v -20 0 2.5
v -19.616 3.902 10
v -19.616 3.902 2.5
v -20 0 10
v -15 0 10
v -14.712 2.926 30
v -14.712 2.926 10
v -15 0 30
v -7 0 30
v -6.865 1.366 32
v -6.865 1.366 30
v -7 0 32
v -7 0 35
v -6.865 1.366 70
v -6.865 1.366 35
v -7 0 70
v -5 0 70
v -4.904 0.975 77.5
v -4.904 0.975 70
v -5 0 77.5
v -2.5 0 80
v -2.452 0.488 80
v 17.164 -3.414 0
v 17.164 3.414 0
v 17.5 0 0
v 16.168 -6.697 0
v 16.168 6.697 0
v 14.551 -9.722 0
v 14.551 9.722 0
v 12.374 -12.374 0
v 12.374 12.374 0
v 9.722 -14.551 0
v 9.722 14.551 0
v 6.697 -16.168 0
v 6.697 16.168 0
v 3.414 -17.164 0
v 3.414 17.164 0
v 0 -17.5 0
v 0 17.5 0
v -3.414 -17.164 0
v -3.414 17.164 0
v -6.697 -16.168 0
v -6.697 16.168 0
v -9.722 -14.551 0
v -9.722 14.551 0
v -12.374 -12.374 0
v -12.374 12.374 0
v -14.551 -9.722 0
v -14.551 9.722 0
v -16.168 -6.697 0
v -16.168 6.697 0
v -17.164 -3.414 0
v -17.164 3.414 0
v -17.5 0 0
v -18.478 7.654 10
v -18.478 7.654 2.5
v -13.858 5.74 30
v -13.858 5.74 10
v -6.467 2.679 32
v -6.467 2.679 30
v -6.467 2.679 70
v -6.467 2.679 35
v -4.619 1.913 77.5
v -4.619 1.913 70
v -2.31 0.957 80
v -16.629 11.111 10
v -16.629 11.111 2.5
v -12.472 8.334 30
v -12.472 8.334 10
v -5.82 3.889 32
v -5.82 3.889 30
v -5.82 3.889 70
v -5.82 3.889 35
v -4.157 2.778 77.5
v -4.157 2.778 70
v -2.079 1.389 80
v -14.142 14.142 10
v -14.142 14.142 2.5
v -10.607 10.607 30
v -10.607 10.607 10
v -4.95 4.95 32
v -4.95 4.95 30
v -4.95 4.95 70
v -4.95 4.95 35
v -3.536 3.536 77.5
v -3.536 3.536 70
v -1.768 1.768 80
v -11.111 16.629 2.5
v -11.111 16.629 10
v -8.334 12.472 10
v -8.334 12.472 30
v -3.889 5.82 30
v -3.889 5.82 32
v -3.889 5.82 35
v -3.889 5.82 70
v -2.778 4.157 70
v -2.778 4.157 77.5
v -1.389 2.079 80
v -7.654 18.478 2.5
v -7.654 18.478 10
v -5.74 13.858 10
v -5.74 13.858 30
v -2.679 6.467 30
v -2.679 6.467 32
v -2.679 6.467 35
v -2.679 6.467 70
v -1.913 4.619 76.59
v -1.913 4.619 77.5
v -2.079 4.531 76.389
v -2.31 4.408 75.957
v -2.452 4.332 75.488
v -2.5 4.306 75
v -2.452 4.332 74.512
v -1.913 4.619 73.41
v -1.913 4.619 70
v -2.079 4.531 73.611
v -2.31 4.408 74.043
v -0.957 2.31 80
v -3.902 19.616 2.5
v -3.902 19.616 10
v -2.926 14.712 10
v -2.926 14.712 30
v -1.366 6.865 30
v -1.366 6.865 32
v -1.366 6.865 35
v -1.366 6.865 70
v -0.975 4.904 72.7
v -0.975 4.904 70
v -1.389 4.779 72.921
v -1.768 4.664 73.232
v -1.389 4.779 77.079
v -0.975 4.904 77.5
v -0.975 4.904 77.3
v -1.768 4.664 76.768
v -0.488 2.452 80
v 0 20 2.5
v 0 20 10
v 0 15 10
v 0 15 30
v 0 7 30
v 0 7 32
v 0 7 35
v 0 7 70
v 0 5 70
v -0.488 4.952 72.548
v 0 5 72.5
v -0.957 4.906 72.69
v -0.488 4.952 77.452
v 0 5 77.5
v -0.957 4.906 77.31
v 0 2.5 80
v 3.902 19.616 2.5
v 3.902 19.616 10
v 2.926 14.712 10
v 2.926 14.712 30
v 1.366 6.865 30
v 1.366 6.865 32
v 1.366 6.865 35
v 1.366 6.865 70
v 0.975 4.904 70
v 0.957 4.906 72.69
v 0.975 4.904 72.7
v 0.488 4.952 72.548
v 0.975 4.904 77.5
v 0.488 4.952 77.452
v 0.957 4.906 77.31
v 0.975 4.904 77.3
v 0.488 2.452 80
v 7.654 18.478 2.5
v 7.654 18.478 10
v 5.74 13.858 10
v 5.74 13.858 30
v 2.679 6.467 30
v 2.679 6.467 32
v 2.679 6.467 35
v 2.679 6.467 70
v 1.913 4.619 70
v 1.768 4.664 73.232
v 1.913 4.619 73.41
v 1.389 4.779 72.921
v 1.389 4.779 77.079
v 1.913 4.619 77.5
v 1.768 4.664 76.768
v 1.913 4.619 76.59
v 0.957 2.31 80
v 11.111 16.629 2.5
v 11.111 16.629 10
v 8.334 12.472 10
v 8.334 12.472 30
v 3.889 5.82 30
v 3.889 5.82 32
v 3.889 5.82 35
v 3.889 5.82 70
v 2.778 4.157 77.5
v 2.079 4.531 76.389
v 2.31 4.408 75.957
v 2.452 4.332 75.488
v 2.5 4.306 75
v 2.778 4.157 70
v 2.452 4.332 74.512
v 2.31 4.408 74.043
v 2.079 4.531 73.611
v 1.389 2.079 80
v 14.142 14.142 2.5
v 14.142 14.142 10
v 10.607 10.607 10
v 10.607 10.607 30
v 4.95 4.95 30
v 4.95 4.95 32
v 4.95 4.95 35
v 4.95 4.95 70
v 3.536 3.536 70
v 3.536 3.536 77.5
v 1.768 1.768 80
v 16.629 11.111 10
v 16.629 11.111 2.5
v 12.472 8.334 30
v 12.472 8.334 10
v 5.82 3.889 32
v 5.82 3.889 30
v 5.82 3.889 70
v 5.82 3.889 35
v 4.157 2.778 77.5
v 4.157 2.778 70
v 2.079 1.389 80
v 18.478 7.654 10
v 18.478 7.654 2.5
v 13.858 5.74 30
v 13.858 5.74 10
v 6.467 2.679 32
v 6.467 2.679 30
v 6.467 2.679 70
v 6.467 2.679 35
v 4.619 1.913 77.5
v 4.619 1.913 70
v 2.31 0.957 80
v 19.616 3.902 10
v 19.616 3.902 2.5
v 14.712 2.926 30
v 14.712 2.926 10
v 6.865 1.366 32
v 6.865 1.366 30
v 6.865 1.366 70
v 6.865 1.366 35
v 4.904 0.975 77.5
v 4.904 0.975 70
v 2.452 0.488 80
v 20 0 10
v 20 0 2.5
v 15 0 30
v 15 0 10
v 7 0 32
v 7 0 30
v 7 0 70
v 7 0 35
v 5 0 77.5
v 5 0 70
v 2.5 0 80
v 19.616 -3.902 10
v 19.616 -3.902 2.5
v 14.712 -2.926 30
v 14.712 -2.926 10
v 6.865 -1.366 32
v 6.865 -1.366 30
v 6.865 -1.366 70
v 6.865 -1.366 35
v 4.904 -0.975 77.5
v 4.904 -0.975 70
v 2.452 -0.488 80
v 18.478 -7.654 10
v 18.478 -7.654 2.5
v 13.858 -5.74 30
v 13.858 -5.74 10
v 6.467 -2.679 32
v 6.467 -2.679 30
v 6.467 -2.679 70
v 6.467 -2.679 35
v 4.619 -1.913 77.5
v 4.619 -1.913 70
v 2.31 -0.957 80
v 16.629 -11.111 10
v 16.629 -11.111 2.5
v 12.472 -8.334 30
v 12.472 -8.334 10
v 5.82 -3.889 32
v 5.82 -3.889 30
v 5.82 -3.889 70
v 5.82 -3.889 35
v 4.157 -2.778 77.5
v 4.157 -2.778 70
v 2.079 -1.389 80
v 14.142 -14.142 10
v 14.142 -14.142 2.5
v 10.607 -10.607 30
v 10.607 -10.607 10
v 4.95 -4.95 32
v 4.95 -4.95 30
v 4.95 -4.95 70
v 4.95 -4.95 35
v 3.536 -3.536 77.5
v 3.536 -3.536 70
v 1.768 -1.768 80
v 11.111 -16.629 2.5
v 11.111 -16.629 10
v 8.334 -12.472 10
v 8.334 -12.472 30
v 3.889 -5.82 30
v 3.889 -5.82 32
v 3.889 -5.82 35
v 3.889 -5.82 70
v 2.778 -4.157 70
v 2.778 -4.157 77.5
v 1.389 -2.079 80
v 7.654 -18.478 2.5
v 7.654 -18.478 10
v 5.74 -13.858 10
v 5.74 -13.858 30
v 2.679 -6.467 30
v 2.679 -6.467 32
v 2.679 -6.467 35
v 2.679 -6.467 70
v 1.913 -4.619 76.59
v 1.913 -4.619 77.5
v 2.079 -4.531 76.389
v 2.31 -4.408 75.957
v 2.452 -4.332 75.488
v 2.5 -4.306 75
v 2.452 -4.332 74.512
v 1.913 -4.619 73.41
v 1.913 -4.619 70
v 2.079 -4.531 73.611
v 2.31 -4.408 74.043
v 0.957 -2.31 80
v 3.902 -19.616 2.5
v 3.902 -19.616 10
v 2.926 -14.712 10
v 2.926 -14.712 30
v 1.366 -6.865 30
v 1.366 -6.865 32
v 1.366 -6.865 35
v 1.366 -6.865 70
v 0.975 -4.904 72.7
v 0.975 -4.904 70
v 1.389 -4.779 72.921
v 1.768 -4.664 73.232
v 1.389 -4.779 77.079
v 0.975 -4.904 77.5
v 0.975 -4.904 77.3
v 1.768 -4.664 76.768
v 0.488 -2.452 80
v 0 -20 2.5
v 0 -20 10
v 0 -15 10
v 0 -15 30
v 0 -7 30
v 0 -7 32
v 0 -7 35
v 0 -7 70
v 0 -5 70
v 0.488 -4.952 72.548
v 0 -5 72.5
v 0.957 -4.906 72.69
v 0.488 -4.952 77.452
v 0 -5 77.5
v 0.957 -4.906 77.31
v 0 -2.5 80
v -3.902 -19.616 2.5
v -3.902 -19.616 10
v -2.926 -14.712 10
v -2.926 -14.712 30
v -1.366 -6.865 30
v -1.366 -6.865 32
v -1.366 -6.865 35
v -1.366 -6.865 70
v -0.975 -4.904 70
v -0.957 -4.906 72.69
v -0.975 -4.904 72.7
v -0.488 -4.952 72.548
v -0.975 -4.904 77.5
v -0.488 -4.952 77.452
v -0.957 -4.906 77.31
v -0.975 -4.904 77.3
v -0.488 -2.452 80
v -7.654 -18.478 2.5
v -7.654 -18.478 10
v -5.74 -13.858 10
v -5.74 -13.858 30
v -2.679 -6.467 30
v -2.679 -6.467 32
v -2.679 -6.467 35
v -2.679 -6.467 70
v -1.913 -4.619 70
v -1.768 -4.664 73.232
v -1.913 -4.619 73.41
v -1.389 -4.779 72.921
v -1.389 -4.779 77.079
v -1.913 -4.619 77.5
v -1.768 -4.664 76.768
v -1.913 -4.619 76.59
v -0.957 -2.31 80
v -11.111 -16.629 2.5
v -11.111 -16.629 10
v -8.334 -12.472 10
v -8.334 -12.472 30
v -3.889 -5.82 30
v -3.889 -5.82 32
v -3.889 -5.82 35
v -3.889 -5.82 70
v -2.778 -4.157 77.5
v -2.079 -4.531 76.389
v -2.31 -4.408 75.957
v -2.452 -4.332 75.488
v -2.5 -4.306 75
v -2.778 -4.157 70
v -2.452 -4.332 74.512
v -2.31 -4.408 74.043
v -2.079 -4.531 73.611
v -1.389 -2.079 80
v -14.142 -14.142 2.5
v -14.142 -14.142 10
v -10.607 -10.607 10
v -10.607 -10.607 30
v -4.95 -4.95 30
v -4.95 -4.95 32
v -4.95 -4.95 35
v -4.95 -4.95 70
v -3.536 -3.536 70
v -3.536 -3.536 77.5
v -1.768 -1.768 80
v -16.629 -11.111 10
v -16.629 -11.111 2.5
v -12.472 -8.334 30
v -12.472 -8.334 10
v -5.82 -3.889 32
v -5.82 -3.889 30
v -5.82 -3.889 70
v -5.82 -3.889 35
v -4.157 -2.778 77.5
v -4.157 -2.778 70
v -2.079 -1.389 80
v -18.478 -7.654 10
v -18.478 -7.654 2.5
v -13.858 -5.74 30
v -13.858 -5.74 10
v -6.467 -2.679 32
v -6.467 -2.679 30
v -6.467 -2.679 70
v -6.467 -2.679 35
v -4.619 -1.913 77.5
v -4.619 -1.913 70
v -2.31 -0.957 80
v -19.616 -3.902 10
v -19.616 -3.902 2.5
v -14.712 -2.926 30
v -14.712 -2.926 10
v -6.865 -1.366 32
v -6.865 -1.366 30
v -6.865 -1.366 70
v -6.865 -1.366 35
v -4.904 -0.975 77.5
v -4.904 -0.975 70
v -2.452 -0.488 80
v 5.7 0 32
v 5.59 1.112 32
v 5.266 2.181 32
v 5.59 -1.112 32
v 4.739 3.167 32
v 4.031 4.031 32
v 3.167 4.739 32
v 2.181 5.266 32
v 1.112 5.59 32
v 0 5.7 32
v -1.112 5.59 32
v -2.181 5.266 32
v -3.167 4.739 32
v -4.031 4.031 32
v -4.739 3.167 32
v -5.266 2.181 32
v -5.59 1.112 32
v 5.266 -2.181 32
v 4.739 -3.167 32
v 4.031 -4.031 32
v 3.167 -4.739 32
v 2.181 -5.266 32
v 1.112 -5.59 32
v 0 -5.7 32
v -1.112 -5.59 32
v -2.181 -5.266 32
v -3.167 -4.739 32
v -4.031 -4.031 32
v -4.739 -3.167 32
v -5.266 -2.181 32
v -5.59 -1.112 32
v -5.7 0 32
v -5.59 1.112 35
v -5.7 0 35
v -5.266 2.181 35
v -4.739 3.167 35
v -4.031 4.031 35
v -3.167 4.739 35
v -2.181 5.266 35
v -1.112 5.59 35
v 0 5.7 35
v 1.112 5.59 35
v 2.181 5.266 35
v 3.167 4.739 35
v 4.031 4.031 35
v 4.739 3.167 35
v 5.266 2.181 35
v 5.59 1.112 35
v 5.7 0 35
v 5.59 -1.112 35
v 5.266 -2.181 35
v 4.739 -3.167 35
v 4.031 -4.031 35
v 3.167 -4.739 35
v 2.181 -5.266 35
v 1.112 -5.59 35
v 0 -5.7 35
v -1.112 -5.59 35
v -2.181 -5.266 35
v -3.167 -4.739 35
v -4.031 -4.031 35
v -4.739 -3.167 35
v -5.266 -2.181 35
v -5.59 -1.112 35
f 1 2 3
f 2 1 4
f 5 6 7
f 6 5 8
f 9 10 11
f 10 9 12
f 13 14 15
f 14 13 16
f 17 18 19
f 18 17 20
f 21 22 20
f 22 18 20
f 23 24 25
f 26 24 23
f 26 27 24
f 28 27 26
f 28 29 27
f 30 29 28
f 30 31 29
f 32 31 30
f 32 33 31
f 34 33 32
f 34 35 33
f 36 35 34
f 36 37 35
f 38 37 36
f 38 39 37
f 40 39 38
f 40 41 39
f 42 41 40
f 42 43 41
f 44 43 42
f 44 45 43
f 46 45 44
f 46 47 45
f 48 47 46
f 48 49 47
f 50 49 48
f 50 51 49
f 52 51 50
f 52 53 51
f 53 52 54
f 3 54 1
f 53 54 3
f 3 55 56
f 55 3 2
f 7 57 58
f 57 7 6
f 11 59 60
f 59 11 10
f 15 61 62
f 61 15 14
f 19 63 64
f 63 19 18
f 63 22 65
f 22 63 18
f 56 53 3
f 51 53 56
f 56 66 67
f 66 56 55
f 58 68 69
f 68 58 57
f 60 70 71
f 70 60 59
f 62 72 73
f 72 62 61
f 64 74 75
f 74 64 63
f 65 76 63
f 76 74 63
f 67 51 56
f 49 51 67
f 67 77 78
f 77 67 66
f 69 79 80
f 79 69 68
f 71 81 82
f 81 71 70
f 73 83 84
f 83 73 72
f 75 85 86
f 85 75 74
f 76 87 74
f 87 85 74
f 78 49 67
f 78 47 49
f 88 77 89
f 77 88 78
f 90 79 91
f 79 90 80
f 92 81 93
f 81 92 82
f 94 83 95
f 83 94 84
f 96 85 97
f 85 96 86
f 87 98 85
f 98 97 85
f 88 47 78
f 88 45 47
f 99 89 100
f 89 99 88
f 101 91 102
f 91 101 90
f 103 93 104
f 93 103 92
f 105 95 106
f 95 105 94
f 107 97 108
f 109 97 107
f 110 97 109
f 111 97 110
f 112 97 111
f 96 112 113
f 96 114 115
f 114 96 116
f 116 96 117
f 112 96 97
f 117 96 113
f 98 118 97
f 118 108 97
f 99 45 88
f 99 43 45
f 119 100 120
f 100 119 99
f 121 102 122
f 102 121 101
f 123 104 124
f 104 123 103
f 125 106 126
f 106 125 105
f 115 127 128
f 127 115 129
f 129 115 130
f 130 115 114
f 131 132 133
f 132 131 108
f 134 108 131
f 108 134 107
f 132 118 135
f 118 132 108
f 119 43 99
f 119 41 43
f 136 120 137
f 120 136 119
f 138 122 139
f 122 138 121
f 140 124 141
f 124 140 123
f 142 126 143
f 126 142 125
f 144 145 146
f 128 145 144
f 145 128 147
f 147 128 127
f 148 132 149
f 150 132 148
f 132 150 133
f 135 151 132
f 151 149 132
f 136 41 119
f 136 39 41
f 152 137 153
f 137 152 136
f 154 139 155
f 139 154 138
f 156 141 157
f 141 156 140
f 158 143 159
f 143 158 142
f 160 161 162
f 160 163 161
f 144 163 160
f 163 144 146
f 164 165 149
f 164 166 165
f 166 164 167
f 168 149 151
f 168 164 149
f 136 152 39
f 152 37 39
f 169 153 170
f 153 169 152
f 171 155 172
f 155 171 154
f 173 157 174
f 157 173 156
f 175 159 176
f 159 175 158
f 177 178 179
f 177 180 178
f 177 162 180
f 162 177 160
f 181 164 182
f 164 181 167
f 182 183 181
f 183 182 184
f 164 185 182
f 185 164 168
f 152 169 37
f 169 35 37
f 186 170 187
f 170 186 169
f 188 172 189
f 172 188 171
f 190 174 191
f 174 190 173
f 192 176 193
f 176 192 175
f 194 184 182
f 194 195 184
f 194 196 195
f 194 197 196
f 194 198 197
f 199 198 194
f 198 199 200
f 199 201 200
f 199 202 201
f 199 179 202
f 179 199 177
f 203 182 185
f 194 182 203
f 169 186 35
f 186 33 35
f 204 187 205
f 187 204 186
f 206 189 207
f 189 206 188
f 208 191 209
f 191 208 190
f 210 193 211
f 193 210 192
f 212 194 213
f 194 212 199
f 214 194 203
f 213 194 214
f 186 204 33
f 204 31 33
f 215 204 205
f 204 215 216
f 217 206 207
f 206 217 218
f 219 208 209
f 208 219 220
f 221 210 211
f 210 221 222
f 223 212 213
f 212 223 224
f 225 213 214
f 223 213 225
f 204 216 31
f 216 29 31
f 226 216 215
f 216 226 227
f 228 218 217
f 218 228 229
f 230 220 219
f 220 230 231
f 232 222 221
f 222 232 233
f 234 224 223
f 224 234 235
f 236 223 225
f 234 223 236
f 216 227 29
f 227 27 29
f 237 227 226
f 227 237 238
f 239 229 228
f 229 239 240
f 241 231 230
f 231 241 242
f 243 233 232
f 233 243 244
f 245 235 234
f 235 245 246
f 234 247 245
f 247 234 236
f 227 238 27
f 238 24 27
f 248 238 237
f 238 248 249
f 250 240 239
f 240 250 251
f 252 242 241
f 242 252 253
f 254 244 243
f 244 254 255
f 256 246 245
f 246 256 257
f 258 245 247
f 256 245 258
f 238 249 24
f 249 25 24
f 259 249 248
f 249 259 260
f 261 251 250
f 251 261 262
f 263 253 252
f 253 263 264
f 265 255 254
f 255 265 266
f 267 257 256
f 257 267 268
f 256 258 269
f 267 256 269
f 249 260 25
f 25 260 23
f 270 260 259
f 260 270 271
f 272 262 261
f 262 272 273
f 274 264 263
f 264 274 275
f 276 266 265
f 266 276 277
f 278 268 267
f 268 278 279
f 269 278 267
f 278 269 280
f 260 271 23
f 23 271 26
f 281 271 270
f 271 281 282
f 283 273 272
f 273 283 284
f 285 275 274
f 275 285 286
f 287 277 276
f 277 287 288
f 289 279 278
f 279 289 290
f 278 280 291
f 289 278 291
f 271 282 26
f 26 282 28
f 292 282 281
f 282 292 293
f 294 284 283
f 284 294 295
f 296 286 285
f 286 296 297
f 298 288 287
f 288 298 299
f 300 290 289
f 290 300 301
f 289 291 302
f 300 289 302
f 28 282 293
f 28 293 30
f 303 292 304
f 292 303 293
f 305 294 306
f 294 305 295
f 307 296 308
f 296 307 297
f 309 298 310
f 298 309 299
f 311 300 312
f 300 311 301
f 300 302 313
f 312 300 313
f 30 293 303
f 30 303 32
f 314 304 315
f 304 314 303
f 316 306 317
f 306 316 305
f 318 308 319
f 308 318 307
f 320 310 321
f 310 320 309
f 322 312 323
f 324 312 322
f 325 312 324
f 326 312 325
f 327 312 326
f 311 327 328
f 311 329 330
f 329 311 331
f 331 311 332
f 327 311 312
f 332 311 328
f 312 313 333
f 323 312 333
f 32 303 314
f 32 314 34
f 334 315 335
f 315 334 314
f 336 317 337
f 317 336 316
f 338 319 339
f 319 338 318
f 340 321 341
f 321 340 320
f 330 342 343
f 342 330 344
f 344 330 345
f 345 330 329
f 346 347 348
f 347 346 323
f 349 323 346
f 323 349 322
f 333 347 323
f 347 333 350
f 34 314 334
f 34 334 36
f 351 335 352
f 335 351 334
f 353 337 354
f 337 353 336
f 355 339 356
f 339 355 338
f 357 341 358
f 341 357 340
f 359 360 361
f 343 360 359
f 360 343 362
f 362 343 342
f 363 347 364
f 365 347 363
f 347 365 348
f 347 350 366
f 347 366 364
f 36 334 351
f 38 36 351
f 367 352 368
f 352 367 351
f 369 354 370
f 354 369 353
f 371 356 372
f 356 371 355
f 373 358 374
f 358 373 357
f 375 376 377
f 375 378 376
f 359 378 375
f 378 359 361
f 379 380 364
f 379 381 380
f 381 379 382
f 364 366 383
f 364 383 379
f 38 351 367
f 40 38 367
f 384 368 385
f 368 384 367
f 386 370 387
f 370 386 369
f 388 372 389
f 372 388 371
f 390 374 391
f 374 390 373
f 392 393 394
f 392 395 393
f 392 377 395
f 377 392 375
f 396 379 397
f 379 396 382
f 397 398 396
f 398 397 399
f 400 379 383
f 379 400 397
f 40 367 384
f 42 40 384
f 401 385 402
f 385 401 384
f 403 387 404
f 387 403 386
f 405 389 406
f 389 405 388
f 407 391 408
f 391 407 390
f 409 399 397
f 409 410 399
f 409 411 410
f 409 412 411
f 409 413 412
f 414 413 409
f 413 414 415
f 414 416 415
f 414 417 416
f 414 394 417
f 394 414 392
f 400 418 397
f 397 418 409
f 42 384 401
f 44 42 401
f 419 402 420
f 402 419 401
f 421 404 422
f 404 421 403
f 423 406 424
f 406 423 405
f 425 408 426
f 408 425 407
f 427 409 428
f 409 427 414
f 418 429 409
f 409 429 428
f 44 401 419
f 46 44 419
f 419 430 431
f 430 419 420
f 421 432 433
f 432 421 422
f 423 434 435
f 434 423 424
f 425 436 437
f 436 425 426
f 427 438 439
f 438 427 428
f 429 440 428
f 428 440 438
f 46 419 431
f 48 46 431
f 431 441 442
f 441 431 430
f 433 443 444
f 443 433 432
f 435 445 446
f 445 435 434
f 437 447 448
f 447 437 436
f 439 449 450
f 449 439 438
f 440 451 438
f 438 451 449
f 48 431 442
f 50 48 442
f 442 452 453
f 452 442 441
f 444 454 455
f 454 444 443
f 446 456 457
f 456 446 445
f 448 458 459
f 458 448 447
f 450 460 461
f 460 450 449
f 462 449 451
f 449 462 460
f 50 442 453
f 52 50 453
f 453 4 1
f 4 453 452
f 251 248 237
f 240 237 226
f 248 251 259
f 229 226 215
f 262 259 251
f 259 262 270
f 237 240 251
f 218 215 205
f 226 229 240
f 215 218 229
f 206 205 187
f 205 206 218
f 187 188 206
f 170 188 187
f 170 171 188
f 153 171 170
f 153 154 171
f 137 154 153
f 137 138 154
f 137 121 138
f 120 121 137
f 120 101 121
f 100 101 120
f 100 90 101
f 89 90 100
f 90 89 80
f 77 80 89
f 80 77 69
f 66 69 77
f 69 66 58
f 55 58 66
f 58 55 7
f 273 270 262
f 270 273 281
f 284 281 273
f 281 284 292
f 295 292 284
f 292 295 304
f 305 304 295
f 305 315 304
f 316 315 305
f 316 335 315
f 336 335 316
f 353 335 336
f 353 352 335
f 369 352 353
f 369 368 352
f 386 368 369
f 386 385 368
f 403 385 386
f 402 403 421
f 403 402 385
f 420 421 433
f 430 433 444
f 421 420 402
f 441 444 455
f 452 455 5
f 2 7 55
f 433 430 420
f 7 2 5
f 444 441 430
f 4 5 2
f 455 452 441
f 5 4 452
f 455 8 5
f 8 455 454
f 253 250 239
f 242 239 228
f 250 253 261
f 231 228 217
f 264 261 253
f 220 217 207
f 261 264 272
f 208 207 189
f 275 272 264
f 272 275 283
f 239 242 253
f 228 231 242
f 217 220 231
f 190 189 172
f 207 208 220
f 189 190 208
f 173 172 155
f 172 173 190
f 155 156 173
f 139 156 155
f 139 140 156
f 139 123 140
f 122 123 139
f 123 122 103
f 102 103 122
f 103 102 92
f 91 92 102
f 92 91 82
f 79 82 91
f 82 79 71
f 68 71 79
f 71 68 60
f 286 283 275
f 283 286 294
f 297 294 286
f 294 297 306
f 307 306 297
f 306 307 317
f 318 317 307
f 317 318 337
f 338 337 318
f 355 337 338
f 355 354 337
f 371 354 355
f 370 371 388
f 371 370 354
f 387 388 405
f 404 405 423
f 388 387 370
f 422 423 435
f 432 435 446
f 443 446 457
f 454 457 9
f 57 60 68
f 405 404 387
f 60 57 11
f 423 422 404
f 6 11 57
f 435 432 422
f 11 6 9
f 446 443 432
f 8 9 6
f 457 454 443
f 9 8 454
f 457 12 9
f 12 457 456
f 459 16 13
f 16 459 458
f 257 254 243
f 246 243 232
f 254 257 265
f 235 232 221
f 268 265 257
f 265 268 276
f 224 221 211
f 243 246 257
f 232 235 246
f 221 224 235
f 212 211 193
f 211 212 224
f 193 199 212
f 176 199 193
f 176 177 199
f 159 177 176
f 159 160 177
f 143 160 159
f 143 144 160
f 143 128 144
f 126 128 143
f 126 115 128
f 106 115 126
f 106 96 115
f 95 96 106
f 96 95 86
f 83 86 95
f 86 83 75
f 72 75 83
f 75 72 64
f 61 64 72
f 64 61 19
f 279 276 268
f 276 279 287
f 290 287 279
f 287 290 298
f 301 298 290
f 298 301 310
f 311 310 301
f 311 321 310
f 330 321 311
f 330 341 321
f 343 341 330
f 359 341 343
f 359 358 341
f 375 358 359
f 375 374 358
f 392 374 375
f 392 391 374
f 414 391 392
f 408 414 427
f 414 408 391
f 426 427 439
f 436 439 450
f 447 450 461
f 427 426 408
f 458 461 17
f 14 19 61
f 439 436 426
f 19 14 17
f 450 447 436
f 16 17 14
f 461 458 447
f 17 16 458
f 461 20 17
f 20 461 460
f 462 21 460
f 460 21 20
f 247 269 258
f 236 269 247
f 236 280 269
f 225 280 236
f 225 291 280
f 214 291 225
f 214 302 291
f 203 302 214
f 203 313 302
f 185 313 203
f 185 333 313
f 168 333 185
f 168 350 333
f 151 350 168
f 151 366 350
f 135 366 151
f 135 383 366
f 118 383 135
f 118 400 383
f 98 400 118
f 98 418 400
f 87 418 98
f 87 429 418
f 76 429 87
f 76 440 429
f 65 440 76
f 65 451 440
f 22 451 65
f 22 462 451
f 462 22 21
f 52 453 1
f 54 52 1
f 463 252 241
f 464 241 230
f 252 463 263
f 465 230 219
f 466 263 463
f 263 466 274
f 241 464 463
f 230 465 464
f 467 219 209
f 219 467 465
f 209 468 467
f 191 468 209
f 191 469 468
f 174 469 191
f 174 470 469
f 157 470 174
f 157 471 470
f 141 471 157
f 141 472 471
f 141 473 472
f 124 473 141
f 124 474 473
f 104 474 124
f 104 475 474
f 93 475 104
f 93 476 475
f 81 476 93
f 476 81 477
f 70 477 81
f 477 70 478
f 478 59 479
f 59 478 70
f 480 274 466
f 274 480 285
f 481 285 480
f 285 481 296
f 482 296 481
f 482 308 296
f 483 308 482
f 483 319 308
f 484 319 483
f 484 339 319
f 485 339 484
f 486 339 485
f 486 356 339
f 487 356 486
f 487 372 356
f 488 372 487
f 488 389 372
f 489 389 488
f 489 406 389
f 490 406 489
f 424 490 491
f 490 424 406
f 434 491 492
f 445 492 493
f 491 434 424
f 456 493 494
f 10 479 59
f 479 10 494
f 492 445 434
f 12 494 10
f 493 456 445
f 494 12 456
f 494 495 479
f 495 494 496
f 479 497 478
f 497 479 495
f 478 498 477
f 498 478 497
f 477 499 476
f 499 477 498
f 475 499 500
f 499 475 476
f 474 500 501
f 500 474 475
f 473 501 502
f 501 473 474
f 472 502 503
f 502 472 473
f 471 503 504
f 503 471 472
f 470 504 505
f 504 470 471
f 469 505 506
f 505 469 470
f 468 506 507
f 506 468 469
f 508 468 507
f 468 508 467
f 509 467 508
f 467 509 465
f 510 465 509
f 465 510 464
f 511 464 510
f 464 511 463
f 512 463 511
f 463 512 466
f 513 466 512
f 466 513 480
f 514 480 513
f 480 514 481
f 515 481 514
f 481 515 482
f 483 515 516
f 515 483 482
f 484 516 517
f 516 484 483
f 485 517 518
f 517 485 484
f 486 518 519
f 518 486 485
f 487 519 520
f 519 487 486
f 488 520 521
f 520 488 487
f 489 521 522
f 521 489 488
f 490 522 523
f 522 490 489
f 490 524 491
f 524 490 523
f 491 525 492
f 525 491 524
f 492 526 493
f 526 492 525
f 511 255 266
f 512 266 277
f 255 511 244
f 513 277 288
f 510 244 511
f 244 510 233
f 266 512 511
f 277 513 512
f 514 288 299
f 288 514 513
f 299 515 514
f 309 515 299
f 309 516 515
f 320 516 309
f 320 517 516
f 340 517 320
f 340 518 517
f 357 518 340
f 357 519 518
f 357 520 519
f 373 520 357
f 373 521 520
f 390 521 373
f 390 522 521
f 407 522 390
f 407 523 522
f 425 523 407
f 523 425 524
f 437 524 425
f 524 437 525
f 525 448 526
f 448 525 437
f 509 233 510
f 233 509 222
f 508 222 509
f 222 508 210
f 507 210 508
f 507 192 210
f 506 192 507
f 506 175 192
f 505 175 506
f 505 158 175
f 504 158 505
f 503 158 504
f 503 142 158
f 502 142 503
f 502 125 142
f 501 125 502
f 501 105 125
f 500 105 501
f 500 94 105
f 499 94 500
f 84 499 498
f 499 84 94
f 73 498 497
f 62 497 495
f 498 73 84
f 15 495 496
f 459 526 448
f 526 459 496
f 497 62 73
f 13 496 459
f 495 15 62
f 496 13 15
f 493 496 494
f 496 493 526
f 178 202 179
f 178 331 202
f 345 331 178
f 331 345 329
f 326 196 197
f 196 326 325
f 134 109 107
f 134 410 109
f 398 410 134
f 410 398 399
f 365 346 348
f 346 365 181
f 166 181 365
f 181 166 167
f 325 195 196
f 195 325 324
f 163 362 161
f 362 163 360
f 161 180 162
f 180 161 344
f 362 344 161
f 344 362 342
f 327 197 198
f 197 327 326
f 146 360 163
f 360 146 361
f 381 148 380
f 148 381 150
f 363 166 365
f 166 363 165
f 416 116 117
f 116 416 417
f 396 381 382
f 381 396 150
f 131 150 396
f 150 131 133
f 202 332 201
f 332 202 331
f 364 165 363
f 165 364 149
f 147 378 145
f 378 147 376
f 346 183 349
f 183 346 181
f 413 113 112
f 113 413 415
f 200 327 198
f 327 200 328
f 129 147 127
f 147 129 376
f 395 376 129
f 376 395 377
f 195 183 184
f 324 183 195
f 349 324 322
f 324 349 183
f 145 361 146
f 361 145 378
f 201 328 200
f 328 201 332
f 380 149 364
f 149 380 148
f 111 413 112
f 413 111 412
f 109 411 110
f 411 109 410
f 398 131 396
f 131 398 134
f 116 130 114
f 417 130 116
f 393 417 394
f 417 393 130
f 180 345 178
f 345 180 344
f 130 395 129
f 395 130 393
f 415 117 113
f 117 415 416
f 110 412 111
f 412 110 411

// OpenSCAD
$fn = 32;

// ----------------------------------------------------------------------
// Stepped shaft: diameters 40, 30, 14, 10 mm, 80 mm long
// ----------------------------------------------------------------------

// --- parameters (mm) ---
d1 = 40;                  // step 1 diameter
len1 = 10;                // step 1 length
d2 = 30;                  // step 2 diameter
len2 = 20;                // step 2 length
d3 = 14;                  // step 3 diameter
len3 = 40;                // step 3 length
d4 = 10;                  // step 4 diameter
len4 = 10;                // step 4 length
total = 80;               // overall length
chamfer = 2.5;            // end chamfer
groove_r = 7;             // groove radius
groove_z = 32;            // groove position from the end
groove_w = 3;             // groove width
groove_d = 1.3;           // groove depth
cross_d = 5;              // cross pin hole
cross_z = 75;             // cross hole position

/* closed turning profile: x is the radius, y is the length */
profile = [[0, 0], [20 - chamfer, 0], [20, chamfer], [20, 10], [15, 10], [15, 30], [7, 30], [7, 70], [5, 70], [5, 77.5], [2.5, 80], [0, 80]];

difference() {
  rotate_extrude() polygon(profile);
  /* circlip groove just behind the shoulder */
  rotate_extrude() translate([groove_r - groove_d, groove_z]) square([groove_d + 1, groove_w]);
  /* cross pin hole through the small step */
  translate([0, 0, cross_z]) rotate([90, 0, 0]) cylinder(h = d4 + 4, d = cross_d, center = true);
}
